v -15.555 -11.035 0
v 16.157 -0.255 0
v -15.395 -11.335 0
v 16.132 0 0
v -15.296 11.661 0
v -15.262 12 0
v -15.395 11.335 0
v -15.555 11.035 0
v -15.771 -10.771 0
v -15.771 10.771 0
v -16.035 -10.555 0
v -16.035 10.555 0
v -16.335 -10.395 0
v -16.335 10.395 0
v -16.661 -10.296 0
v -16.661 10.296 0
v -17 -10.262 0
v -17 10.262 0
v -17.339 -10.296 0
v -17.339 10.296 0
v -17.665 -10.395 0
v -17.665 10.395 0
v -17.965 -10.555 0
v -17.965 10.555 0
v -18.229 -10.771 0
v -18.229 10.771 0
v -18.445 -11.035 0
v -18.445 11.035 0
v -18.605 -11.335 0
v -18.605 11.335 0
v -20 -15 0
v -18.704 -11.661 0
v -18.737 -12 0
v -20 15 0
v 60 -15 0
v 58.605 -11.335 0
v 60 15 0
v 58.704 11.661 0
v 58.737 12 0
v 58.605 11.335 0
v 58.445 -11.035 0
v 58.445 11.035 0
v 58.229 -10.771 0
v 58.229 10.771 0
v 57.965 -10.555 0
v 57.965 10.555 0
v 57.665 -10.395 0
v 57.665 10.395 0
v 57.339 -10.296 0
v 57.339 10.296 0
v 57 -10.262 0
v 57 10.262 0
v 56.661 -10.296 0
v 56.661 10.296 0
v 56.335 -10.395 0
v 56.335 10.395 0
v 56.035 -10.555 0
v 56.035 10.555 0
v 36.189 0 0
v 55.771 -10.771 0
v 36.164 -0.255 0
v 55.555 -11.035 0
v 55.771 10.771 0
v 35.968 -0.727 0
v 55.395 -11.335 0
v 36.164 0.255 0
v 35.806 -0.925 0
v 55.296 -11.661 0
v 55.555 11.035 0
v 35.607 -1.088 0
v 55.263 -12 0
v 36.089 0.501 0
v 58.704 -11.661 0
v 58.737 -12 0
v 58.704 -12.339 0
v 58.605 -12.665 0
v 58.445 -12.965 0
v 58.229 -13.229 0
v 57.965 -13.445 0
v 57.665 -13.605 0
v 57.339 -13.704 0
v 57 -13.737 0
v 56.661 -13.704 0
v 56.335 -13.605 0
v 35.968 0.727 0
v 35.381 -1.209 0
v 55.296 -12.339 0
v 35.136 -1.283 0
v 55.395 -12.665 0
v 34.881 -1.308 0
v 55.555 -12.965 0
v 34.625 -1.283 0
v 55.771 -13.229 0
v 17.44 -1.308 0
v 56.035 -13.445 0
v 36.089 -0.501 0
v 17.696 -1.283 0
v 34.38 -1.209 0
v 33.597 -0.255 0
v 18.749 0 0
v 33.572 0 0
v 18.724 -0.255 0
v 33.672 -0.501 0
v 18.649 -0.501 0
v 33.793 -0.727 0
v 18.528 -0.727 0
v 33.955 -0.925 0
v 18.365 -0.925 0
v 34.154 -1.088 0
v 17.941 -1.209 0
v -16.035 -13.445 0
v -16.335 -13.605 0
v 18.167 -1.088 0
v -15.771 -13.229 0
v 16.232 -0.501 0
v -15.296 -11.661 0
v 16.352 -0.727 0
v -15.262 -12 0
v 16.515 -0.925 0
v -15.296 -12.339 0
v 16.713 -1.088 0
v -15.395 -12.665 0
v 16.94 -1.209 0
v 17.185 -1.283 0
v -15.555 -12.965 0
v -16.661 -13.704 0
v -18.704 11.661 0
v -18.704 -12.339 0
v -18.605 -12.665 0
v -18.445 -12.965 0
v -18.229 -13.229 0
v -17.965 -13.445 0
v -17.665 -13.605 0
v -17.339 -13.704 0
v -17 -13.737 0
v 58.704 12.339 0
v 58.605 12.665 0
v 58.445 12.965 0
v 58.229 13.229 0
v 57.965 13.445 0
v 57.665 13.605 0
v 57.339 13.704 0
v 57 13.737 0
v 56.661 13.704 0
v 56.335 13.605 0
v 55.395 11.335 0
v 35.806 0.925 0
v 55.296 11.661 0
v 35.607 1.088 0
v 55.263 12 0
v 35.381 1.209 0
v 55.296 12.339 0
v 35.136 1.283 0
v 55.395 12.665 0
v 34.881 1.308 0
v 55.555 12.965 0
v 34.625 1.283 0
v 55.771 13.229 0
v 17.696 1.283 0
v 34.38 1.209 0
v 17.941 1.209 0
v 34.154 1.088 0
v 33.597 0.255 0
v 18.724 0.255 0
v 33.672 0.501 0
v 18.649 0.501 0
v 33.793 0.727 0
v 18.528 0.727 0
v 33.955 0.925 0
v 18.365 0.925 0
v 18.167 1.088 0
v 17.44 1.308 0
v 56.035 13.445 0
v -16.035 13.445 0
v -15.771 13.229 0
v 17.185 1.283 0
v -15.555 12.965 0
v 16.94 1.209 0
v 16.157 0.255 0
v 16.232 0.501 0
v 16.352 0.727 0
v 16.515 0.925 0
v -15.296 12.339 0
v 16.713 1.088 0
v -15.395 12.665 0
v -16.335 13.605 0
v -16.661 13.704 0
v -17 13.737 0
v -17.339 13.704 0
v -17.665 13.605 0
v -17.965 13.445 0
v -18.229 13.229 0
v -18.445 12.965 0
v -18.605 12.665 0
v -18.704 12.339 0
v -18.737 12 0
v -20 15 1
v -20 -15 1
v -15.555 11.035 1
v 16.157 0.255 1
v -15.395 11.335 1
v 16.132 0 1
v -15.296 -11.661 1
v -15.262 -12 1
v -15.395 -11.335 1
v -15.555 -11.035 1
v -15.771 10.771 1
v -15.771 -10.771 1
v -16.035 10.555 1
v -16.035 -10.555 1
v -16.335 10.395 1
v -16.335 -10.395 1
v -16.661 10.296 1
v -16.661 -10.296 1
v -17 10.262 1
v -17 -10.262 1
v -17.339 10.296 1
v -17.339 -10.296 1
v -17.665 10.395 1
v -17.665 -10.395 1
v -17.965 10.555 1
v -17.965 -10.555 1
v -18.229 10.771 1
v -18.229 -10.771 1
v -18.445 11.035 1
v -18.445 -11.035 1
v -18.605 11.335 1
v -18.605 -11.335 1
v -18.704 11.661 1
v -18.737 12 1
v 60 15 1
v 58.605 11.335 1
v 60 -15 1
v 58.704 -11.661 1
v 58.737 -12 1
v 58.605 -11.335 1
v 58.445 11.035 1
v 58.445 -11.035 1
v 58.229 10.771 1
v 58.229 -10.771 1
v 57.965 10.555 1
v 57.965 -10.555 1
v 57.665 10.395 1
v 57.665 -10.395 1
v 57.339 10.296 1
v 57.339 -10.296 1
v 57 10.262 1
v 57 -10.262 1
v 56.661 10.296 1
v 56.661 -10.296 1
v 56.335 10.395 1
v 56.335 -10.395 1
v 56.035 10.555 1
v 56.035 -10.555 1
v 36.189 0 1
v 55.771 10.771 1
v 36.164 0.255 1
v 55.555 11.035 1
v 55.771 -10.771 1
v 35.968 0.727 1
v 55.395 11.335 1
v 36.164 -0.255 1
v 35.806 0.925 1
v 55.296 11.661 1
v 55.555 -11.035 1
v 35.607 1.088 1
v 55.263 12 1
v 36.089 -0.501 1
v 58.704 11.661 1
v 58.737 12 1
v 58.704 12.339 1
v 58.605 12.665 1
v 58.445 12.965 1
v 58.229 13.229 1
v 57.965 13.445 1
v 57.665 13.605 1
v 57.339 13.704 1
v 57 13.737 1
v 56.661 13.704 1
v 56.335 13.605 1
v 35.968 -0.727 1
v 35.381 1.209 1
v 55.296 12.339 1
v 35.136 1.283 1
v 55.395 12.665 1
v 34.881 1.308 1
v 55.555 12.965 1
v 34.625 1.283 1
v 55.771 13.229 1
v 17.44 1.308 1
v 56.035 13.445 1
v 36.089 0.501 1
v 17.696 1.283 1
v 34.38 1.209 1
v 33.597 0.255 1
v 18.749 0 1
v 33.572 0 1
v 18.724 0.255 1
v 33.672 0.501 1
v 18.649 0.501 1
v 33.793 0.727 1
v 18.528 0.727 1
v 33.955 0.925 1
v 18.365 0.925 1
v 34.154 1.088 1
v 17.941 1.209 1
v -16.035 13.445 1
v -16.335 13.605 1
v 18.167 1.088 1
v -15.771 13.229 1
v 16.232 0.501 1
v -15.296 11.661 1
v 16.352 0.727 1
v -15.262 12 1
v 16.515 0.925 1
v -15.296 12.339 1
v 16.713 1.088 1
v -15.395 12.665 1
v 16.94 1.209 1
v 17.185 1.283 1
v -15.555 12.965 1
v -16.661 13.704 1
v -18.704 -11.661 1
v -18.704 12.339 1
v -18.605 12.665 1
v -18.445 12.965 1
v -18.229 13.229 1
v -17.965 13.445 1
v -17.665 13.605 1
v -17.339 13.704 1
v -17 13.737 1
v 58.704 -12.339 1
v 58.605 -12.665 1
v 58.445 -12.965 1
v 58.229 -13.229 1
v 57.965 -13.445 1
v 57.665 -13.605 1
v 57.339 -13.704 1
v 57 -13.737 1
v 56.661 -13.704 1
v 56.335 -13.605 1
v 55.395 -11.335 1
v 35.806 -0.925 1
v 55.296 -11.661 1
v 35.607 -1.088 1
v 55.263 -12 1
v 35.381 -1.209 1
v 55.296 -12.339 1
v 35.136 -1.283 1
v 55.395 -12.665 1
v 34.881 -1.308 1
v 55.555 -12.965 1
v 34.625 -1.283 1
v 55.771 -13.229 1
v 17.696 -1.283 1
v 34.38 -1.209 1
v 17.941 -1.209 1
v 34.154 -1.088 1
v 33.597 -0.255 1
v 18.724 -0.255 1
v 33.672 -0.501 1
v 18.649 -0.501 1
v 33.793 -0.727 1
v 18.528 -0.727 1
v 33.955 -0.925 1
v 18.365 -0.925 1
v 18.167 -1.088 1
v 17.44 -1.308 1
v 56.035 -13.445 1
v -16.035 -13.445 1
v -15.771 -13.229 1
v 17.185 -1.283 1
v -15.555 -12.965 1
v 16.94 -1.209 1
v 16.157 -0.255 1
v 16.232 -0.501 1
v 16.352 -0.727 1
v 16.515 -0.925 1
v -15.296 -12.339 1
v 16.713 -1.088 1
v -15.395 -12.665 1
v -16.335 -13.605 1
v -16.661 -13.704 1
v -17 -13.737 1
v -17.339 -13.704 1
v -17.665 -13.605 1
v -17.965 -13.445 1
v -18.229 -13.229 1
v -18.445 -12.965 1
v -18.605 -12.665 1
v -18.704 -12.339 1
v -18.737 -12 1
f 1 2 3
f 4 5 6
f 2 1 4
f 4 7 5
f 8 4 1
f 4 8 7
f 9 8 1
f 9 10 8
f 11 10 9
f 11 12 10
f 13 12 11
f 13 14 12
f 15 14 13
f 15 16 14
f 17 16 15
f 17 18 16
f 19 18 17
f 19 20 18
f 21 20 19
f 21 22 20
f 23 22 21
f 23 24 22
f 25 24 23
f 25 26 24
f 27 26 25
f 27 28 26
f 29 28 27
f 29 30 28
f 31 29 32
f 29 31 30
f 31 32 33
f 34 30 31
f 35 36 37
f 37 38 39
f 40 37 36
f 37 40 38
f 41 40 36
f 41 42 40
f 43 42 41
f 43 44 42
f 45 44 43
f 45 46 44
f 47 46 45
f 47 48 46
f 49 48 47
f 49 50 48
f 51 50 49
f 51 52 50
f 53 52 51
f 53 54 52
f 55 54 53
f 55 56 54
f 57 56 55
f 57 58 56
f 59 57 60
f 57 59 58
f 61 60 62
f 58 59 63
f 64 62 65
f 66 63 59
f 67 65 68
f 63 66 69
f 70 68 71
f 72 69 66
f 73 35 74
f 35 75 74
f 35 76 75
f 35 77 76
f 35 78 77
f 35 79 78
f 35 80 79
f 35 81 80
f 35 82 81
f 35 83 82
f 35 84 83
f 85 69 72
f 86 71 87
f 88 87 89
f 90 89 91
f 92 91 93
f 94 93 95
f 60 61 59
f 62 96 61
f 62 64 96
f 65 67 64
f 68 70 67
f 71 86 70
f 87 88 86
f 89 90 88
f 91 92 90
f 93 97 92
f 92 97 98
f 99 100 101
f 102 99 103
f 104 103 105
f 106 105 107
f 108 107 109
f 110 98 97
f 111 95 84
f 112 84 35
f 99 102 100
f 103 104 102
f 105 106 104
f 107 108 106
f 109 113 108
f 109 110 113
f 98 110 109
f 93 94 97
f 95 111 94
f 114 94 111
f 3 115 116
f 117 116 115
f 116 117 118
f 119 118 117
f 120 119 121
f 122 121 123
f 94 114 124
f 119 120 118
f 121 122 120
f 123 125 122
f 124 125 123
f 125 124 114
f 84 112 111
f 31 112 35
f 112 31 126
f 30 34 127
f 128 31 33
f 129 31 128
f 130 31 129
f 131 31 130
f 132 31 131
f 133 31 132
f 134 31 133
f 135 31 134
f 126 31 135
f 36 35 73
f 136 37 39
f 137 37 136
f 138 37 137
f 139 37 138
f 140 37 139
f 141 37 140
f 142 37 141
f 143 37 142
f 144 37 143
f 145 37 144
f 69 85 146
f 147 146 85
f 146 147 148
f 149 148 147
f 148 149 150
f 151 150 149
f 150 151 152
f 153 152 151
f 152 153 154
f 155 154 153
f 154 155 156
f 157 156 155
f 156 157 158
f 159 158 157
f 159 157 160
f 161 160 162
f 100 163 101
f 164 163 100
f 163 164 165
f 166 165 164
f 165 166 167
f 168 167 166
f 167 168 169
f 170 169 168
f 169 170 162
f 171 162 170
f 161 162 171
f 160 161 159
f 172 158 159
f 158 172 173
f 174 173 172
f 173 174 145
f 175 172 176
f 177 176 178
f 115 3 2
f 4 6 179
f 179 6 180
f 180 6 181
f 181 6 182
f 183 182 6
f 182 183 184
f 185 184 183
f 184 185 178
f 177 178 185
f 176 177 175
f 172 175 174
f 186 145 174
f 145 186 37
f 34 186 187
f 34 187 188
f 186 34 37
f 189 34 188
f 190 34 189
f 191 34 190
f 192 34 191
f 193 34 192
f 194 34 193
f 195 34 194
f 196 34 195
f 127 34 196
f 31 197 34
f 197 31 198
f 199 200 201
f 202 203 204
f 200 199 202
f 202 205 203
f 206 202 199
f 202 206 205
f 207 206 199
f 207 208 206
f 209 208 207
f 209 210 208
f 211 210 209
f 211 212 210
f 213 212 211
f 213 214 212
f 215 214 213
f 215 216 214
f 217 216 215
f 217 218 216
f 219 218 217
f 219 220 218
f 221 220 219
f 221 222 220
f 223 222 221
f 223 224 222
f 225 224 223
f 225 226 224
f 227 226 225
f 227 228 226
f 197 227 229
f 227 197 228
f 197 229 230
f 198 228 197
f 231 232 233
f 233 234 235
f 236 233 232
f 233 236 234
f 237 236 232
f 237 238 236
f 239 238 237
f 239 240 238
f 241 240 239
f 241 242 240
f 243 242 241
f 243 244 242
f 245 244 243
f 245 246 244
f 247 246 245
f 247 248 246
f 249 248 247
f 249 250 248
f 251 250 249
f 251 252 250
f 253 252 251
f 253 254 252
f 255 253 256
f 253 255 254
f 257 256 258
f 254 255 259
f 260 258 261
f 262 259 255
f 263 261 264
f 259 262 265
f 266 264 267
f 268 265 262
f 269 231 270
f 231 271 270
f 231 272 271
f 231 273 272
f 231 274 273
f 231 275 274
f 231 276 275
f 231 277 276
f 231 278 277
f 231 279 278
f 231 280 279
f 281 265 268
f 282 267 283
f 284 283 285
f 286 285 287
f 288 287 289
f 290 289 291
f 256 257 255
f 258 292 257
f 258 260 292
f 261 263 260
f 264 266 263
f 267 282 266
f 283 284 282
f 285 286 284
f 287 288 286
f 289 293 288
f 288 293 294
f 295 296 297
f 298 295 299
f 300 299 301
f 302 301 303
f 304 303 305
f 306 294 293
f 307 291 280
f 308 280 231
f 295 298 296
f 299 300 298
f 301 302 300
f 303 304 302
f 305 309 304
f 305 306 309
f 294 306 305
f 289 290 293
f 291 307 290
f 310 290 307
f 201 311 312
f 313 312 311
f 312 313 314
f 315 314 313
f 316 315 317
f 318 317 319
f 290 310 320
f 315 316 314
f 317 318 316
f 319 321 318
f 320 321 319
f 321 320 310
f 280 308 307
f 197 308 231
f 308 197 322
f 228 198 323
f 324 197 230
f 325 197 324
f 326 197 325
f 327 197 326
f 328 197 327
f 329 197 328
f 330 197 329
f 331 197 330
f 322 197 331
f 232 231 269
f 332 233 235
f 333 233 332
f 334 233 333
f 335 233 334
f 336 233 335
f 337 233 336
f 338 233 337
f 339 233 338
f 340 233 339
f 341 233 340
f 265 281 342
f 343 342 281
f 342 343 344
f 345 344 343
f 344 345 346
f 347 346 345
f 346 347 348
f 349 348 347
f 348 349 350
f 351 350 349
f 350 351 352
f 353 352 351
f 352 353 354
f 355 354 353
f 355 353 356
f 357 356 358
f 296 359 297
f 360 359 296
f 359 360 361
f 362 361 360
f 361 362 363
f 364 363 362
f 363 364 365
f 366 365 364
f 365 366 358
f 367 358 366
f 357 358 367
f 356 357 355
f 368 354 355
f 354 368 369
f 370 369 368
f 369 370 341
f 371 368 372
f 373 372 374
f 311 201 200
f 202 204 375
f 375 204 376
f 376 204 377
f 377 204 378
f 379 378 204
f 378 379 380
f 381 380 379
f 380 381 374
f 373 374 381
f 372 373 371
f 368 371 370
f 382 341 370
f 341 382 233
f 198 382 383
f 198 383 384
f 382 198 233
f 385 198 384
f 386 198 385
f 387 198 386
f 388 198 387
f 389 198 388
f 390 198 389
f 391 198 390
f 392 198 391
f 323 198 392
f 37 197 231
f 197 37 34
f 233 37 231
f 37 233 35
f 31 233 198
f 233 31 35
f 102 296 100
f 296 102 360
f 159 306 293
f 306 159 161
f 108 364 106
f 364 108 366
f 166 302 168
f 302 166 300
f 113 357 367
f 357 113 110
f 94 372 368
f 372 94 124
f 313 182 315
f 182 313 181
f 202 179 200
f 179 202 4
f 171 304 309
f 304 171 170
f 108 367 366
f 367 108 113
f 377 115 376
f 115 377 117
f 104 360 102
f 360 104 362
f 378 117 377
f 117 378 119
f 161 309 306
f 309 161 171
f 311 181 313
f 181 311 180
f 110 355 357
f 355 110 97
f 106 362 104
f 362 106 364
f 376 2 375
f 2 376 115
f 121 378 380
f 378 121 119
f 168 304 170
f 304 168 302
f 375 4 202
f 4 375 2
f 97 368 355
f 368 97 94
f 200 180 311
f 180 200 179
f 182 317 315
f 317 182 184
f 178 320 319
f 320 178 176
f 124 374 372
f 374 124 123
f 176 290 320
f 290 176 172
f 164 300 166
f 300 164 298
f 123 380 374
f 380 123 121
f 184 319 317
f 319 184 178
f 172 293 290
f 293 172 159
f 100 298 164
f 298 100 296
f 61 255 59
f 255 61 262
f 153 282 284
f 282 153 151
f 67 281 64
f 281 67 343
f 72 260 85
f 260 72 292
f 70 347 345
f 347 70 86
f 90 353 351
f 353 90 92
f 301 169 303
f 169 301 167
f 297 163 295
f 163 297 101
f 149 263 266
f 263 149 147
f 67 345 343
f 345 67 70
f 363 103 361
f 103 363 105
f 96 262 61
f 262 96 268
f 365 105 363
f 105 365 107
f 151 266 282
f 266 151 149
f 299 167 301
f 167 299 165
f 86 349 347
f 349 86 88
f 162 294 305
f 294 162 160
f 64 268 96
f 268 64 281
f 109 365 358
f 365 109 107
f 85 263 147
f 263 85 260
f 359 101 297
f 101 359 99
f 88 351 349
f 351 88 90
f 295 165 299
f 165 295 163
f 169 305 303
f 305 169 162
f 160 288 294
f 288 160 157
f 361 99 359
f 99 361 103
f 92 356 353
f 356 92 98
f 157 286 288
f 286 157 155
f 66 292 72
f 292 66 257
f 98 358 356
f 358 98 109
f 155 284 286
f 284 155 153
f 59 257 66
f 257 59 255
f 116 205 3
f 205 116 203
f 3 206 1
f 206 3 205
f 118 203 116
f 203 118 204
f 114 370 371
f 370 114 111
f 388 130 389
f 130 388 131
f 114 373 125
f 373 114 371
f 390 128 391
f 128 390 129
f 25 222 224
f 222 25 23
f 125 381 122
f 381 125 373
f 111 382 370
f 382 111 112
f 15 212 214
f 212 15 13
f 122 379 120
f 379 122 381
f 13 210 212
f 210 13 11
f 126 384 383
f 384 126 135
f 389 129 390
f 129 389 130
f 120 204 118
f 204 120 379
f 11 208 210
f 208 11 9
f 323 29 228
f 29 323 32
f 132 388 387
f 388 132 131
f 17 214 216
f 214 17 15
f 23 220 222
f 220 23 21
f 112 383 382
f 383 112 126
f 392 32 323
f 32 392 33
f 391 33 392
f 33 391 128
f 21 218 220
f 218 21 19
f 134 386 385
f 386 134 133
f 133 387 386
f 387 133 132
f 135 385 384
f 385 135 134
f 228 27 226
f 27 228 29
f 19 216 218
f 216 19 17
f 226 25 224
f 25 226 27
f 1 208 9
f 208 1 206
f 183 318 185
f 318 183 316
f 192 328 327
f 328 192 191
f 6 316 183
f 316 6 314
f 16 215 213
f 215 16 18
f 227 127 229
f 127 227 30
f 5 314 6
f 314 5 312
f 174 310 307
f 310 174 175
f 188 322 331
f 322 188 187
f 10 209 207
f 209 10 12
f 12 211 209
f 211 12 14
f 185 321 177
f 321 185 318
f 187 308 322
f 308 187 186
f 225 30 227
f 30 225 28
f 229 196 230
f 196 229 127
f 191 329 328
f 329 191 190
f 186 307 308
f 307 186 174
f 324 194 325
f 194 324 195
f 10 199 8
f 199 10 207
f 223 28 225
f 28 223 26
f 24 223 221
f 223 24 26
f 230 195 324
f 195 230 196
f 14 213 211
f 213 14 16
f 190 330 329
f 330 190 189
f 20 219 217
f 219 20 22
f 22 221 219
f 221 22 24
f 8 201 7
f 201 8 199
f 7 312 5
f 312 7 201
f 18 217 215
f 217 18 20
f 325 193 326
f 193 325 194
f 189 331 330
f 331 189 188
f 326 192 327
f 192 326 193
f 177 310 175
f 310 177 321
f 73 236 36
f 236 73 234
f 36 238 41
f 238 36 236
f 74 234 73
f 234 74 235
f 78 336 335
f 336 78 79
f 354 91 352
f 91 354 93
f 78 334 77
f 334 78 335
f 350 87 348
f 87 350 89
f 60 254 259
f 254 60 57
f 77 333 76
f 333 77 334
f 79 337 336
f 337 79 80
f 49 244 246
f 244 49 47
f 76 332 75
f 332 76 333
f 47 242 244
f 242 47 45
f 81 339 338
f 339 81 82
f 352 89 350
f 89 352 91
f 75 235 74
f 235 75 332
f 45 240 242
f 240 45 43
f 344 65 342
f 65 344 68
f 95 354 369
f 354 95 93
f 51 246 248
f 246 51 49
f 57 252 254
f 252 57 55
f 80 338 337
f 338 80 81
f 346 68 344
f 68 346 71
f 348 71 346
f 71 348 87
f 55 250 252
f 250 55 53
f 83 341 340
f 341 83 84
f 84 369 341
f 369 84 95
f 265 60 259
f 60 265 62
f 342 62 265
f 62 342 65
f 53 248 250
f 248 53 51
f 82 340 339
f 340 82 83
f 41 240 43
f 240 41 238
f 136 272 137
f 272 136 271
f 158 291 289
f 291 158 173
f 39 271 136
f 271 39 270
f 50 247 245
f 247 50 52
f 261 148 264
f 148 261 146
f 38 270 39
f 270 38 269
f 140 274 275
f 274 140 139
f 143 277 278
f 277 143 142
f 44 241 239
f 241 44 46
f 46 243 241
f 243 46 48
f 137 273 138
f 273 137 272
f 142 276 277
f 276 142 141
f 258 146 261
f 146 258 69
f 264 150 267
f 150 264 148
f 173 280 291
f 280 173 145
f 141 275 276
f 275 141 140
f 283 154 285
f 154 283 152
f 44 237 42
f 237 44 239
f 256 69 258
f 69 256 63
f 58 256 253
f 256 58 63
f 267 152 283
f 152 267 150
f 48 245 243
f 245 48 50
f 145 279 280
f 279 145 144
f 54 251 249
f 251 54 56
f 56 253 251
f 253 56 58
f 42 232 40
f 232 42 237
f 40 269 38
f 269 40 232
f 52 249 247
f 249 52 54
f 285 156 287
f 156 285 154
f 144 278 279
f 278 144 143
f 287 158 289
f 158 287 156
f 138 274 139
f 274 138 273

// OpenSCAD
// motor holder
//
// motor has radius of '$mr' with flattened sides at '$mh' and length of '$ml'

// NOTE:  some tolerance added 
$mr = 10.7; // 10 mm radius + shrinkage
$mh = 15.8; // 15 mm height + shrinkage
$ml = 25.0; // 25.0 mm length excluding 'nubs'
$ml2 = 19.5; // 19.5 mm lengh excluding end cap and shaft guide hole 'nub'

$th = 4.0; // overall thickness of plastic around motor
// NOTE:  wall thickness on sides is 1/2 this

// shaft guide hole size
$sh = 3.1;  // 3.1mm radius
$sw = 2;  // 2mm approximate height of guide
$ft = 1;  // 1mm approximate thickness of face
$pr = 2;  // 2mm appx radius of post

$sd1 = 0.97 * 2.54 * 1.02 / 2; // shaft radius
$sd2 = 1.01 * 2.54 * 1.02 / 2; // loose shaft radius

// motor shaft extension length
$sl = 10.0; // length of shaft from flat end of motor
$gh = 5.5;  // radius of gear hole



// global accuracy parameters
$fn=32; // number of faces in shape

module face(hh)
{
  union()
  {
    difference()
    {
      linear_extrude(height=hh)
        square([$mh + $th, $mr * 2 + $th], true);

      translate([0,0,-1])
        linear_extrude(height=hh+2)
          polygon(points=[[-$mh/2,-$mr],[$mh/2,-$mr],[$mh/2,$mr],[-$mh/2,$mr]]);
    }

    difference()
    {
      linear_extrude(height=hh)
        polygon(points=[[-$mh/2,-$mr],[$mh/2,-$mr],[$mh/2,$mr],[-$mh/2,$mr]]);

      translate([0,0,-1])
        linear_extrude(height=hh+2)
          circle($mr);
    }
  }
}

module motor_holder()
{
  translate([0,0,$ft])
    union()
    {
      color("green")  
        face($sw);

      color("yellow")
        union()
        {
          translate([-$mh/2,-$mr,0])
            linear_extrude(height=$ml2-$sw+1)
              circle($pr);

          translate([-$mh/2,$mr,0])
            linear_extrude(height=$ml2-$sw+1)
              circle($pr);

          translate([$mh/2,-$mr,0])
            linear_extrude(height=$ml2-$sw+1)
              circle($pr);

          translate([$mh/2,$mr,0])
            linear_extrude(height=$ml2-$sw+1)
              circle($pr);
        }

      color("blue")
        translate([0, 0, $ml2-$sw])
          face($sw);
    }

//  color("purple")
//    difference()
//    {
//      linear_extrude(height=$ft)
//        square([$mh + $th, $mr * 2 + $th], true);
  
//      translate([0,0,-1])
//        linear_extrude(height=$ft+2)
//          circle($gh);
//    }
}

//  echo("****************");
//  echo("face is ",$mh+$th," by ", $mr * 2 + $th," (mm)");

//  echo("overall height is ", $ft + $ml2, " (mm)");
//  echo("****************");

$xd = 25.4 / 8 + 0.3; // screw holes

//rotate(a=[0,0,90])
//  motor_holder();

color("orange")
  difference()
  {
    translate([20,0,0])
      linear_extrude(height=$ft)
        square([80,30],true);

//    translate([0,0,-1])
//      linear_extrude(height=$ft+2)
//        circle($gh);

  // from gear_test2
  // gear wheel radius: 0.125 in 3.175 mm
  // Tooth side length: 0.0669041 in 1.69937 mm
  // gear radius: 0.185786 in 4.71897 mm

  // from gear-test4
  // gear wheel radius: 0.4923, in 12.5044 mm
  // Tooth side length: 0.0669012 in 1.69929 mm
  // gear radius: 0.557684 in 14.1652 mm

    translate([3.175+14.1653+0.1, 0,-1])
      linear_extrude(height=$ft+2)
        circle($sd2);
    
    translate([2*(3.175+14.1653+0.1), 0,-1])
      linear_extrude(height=$ft+2)
        circle($sd2);

    translate([-17,-12,-1])
      linear_extrude(height=$ft+2)
        circle(d=$xd);
    translate([-17,12,-1])
      linear_extrude(height=$ft+2)
        circle(d=$xd);
    translate([57,-12,-1])
      linear_extrude(height=$ft+2)
        circle(d=$xd);
    translate([57,12,-1])
      linear_extrude(height=$ft+2)
        circle(d=$xd);
  }
